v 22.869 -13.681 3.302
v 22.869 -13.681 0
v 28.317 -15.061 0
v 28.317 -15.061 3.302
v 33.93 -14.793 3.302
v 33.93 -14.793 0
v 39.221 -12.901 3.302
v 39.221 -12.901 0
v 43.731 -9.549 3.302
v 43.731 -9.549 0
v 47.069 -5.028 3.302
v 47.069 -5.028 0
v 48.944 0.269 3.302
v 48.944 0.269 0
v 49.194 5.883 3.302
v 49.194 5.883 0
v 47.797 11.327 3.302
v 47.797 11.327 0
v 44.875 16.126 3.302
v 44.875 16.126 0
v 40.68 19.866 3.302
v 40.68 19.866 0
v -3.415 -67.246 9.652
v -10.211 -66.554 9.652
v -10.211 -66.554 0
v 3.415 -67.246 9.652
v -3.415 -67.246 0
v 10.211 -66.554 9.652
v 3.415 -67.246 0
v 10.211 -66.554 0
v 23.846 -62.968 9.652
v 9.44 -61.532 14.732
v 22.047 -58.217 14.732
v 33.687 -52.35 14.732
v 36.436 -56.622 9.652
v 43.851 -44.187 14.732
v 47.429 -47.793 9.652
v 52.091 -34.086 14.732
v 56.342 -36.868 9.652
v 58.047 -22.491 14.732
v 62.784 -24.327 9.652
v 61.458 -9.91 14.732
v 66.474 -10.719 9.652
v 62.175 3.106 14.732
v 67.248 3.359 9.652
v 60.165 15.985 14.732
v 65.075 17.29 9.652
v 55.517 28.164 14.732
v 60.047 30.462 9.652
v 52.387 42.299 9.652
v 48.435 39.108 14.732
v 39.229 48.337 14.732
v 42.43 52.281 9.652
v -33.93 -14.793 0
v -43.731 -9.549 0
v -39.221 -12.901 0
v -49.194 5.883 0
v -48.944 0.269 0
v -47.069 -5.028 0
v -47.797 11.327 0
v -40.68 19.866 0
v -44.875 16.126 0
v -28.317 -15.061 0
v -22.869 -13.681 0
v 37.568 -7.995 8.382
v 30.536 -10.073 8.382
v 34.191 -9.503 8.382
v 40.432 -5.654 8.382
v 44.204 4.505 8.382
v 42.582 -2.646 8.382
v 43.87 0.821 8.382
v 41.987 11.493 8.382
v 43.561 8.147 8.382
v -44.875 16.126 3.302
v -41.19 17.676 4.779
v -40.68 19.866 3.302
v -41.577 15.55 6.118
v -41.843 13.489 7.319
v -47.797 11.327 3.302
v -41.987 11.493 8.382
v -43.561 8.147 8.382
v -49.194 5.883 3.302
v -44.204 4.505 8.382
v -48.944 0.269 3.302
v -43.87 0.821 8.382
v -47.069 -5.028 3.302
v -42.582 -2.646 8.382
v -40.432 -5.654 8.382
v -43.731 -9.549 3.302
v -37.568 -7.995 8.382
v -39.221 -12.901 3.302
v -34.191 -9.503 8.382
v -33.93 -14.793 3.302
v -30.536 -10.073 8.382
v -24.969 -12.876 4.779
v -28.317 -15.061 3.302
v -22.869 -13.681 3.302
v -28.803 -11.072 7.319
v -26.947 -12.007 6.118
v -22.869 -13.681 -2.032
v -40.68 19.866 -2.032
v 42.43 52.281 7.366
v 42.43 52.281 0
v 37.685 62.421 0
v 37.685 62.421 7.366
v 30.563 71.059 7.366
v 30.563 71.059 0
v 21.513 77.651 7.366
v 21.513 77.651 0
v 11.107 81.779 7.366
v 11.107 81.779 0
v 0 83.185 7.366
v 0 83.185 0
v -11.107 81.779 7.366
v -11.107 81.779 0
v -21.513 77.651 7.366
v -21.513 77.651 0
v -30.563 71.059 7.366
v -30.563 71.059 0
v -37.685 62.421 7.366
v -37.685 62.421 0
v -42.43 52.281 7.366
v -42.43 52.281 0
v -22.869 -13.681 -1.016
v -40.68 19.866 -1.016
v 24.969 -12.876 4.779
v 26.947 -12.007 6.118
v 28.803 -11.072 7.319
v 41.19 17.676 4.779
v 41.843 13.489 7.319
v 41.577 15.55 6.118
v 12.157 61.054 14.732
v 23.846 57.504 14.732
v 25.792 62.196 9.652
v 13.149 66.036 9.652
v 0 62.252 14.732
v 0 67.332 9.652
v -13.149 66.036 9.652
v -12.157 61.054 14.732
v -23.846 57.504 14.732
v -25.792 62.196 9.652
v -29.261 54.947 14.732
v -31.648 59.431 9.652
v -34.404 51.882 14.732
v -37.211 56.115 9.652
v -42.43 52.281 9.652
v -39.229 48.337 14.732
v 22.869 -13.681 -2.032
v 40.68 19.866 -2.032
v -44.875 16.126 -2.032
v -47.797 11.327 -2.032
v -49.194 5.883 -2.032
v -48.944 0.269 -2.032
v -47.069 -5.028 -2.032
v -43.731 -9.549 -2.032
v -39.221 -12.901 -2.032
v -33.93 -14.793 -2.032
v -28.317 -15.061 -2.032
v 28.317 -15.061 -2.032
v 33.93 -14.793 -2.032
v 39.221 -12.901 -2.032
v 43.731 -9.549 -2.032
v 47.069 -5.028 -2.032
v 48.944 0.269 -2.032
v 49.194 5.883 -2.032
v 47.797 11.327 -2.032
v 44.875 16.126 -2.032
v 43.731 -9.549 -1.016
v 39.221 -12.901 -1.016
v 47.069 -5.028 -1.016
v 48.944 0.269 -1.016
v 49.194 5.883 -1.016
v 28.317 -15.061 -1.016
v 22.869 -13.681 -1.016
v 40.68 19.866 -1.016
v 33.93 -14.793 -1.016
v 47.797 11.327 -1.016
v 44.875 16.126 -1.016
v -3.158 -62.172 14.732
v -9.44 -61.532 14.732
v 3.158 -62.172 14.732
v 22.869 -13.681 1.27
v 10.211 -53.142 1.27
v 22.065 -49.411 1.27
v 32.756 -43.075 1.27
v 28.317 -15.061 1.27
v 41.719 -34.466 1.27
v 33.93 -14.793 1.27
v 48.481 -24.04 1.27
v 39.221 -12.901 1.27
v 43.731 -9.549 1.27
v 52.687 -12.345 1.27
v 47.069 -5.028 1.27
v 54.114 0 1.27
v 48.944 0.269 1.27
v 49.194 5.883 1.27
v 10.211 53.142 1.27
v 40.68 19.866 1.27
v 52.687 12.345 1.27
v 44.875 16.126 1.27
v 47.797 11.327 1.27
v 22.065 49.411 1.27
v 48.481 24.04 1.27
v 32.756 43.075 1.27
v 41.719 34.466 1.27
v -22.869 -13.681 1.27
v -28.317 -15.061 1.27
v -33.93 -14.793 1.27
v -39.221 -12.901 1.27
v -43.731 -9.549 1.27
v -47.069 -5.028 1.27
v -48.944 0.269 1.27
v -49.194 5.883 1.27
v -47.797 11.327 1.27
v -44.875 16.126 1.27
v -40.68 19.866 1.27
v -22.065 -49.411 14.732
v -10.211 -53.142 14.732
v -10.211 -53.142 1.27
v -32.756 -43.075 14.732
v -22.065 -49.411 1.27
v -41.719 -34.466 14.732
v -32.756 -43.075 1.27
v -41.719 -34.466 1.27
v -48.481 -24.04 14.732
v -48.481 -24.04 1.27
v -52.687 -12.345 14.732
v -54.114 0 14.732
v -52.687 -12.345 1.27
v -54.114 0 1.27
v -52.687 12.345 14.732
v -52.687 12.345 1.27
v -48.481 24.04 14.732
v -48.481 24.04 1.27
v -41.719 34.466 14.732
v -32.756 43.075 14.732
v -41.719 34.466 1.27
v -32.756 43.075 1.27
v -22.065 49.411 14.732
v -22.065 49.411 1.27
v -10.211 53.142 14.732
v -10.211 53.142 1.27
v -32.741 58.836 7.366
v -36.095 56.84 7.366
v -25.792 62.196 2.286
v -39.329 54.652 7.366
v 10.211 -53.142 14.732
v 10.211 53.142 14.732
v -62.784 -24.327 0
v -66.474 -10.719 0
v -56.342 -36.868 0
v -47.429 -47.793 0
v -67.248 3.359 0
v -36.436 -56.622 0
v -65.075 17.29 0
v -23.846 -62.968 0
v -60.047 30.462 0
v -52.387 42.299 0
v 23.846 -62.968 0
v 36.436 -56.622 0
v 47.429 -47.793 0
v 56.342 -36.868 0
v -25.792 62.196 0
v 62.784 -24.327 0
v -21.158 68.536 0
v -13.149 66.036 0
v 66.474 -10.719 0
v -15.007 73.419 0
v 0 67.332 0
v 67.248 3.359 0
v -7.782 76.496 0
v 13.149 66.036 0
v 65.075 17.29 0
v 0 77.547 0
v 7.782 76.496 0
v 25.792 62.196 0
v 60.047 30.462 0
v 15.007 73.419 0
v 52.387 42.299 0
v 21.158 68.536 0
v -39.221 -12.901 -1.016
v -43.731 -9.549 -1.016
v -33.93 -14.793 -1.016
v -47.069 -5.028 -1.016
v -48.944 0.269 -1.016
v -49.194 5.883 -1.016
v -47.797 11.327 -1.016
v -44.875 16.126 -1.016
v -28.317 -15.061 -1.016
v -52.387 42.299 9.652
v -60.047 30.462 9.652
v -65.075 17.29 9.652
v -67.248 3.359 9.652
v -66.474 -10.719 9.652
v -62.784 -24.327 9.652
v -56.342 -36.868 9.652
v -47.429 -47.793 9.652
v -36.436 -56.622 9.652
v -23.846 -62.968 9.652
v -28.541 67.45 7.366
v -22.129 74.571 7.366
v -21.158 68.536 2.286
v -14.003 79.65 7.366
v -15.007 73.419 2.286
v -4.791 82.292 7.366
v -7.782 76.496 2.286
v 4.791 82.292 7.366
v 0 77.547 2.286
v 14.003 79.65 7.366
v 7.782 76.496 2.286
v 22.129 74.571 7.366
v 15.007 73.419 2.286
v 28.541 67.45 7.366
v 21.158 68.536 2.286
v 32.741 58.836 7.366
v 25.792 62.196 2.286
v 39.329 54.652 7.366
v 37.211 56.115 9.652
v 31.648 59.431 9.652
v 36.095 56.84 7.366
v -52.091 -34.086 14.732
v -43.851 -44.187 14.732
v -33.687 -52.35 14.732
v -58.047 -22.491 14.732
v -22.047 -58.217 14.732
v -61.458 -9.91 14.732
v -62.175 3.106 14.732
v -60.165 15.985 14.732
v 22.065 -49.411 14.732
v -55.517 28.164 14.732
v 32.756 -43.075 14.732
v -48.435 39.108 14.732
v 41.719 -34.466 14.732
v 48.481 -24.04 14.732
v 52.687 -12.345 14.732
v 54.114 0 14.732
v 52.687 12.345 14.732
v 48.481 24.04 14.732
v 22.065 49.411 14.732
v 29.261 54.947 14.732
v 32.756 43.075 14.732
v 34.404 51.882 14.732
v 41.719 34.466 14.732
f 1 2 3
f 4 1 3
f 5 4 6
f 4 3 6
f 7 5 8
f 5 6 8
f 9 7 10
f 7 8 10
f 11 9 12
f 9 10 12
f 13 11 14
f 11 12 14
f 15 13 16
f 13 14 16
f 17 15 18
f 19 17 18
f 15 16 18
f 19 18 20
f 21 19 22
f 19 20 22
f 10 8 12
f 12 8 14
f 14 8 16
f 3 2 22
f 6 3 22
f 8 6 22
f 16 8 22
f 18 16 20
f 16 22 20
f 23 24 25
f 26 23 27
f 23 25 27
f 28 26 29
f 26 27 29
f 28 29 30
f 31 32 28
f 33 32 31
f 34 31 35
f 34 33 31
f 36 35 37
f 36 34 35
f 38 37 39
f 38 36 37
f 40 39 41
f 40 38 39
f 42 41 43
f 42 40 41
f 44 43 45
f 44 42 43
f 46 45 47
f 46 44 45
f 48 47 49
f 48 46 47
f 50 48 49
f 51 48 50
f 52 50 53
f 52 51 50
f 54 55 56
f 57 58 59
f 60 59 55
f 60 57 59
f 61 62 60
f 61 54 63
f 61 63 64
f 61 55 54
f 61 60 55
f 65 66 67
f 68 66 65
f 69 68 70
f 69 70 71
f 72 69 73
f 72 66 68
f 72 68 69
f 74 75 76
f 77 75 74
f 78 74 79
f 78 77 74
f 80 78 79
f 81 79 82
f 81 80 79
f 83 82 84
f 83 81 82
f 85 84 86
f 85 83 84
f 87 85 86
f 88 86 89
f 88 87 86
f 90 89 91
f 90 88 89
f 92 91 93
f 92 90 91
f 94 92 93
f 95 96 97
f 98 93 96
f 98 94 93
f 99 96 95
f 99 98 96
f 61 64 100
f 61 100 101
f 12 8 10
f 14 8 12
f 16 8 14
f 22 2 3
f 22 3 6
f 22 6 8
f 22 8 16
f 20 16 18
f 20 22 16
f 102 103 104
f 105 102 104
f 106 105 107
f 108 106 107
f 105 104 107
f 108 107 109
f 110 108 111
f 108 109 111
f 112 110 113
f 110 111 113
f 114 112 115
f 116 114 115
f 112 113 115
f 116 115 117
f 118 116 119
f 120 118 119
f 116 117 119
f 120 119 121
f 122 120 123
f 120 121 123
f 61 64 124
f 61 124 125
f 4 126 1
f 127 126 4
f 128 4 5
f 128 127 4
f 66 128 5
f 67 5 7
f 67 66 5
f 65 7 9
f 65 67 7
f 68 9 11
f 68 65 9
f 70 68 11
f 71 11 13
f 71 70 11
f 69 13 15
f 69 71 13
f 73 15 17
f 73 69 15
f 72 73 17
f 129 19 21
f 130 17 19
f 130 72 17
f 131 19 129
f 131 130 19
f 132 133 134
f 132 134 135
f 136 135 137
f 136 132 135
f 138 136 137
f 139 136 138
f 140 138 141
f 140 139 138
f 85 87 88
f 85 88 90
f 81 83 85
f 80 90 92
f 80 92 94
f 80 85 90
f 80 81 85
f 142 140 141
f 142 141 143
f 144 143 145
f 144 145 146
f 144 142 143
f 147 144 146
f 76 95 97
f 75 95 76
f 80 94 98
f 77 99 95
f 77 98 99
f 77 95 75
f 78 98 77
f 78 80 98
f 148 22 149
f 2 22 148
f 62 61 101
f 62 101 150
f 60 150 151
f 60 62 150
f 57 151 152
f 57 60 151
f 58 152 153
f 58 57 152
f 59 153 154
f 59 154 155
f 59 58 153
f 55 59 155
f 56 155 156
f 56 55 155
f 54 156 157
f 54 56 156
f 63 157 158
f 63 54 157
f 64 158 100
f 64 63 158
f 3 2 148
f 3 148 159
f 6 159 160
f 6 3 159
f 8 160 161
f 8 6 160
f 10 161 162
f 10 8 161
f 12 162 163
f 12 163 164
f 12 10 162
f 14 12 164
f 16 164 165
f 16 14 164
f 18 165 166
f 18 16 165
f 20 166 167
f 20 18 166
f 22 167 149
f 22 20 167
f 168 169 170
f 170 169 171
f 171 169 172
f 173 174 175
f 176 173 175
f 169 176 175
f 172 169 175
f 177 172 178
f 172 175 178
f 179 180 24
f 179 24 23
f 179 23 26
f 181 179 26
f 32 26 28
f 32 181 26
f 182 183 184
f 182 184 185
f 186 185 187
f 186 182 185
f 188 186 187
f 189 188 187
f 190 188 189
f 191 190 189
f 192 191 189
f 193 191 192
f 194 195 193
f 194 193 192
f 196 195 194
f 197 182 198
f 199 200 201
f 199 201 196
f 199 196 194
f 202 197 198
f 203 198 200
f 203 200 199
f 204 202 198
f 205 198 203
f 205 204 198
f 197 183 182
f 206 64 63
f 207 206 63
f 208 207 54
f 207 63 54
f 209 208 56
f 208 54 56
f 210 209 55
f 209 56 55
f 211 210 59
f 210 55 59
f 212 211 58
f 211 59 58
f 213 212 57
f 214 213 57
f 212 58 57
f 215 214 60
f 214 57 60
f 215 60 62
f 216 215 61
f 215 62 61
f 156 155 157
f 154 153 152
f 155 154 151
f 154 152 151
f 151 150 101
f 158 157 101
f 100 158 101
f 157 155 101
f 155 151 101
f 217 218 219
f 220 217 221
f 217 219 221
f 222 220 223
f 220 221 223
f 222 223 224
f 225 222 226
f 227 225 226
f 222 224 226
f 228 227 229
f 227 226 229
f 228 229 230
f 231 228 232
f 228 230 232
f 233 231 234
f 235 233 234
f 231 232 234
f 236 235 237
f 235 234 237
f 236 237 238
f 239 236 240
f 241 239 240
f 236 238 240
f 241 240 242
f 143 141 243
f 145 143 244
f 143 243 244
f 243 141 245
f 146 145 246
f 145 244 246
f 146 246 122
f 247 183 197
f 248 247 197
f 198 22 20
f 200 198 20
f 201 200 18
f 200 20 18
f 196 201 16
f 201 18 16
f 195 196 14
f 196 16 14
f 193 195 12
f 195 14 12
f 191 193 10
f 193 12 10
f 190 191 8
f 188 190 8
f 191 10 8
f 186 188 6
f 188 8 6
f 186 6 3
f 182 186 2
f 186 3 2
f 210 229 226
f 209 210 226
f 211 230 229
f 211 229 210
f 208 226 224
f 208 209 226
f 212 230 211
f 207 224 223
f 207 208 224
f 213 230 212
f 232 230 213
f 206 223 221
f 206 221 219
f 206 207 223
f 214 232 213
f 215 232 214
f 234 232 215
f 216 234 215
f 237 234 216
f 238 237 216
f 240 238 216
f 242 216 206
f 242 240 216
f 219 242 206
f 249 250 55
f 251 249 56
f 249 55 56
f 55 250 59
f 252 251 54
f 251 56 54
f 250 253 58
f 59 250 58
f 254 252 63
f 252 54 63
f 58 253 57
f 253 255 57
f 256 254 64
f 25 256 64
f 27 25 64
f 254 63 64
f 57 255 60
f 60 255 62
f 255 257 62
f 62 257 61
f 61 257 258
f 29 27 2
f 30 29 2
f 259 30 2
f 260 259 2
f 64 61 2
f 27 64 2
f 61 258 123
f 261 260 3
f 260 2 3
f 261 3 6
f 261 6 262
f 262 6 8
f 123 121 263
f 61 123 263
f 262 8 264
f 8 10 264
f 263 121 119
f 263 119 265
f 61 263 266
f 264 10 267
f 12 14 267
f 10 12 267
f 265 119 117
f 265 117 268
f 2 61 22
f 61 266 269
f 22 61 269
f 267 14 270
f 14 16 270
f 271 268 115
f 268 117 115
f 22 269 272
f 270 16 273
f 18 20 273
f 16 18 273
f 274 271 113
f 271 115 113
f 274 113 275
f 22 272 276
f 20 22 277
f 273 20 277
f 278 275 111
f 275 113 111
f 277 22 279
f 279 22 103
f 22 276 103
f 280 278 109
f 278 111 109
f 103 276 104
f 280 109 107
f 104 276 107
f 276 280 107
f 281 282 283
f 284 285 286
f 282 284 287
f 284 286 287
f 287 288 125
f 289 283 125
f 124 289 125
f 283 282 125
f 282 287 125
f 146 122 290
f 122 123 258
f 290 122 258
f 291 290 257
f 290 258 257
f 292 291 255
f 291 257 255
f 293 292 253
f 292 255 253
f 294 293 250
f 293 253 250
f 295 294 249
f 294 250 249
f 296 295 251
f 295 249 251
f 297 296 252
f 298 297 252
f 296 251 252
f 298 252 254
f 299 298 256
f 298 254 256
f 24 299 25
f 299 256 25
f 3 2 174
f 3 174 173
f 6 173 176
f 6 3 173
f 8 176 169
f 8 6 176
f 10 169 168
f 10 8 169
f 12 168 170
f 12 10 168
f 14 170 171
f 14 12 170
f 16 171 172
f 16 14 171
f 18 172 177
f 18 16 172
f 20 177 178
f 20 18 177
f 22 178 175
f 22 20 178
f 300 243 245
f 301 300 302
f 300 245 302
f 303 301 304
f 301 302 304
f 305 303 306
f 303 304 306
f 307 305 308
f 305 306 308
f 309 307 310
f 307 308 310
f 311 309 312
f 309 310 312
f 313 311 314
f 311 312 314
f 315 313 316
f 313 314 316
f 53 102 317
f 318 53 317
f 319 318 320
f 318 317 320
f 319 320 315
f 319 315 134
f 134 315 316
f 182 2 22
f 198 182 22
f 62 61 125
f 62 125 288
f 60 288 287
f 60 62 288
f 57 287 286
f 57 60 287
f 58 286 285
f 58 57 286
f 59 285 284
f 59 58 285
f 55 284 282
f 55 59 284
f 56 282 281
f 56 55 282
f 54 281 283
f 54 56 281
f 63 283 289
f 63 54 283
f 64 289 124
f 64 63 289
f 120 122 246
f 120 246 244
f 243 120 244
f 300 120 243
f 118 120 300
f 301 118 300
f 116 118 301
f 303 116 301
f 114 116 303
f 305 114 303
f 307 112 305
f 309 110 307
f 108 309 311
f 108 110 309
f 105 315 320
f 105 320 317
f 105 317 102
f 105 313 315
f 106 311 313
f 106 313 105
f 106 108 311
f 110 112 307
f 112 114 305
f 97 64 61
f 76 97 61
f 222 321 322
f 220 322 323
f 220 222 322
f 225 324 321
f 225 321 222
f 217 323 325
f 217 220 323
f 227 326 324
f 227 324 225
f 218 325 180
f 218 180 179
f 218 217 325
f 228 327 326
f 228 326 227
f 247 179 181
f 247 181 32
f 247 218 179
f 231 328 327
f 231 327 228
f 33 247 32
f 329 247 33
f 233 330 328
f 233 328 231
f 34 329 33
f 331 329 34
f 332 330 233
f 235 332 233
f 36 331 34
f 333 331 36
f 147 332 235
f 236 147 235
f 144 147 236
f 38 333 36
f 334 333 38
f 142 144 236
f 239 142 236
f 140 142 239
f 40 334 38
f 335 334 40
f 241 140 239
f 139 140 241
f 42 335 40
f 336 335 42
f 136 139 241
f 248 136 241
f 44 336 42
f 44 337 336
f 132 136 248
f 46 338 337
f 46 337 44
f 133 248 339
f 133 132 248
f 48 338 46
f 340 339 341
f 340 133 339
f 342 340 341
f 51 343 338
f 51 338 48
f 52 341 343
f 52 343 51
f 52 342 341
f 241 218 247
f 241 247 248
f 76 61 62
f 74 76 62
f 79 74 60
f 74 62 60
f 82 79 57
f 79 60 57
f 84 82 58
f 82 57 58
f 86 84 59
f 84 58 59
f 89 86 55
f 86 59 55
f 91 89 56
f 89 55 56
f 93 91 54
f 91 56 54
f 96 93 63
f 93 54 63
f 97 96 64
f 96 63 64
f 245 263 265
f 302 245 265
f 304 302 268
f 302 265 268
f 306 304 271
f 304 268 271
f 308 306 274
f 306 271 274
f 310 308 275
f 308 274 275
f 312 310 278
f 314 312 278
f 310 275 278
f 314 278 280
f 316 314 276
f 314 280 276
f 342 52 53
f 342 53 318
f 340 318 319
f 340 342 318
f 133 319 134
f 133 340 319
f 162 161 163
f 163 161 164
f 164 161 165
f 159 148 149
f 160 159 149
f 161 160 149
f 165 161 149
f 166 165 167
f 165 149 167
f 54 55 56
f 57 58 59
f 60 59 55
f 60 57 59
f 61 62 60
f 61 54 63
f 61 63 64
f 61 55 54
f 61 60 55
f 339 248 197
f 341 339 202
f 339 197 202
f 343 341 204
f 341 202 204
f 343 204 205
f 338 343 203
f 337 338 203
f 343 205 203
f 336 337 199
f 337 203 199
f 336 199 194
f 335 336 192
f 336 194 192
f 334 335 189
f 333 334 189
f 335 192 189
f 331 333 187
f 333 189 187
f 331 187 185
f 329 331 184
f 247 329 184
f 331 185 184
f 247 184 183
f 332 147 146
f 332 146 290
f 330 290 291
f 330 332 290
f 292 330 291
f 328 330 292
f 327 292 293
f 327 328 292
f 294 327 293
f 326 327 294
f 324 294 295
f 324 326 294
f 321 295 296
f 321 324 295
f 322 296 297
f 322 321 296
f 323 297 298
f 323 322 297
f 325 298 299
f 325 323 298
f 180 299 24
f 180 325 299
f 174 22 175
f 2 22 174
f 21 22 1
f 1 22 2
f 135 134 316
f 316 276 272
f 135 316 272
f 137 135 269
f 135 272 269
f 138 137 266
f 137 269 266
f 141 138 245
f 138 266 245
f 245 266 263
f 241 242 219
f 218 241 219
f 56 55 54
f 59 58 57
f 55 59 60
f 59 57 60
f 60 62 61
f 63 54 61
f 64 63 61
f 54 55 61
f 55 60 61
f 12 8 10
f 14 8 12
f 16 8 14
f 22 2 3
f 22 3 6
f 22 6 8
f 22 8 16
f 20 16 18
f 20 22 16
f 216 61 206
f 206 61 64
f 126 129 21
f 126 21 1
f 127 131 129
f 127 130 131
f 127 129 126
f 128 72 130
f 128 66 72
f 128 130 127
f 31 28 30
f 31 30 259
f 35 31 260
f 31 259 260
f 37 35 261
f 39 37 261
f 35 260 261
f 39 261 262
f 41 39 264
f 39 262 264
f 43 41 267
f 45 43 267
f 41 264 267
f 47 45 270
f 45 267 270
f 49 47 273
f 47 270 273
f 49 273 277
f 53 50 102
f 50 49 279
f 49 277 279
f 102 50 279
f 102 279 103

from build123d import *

# Parameters (mm, degrees)
F1_DEPTH  = 14.732
F2_DEPTH  = 1.27
F3_DEPTH  = 2.032
F4_DEPTH  = 1.016
F5_DEPTH  = 8.382
F6_SIZE   = 5.08
F6_2_SIZE = 5.08
F7_SIZE   = 5.08
F8_DEPTH  = 7.366
F9_SIZE   = 5.08


with BuildPart() as f1:
    # F0 (on Top) → F1 (new body)
    with BuildSketch(Plane.XY):
        with BuildLine():
            ThreePointArc((10.2107217535, -66.5535269893), (51.0937451166, -43.8527080509), (67.3322418566, 0))
            ThreePointArc((67.3322418566, 0), (60.7887815244, 28.9543577759), (42.4302094544, 52.2810493305))
            ThreePointArc((42.4302094544, 52.2810493305), (34.46970949, 57.840037354), (25.7924495128, 62.1963048868))
            ThreePointArc((25.7924495128, 62.1963048868), (0, 67.3322418566), (-25.7924495128, 62.1963048868))
            ThreePointArc((-25.7924495128, 62.1963048868), (-34.46970949, 57.840037354), (-42.4302094544, 52.2810493305))
            ThreePointArc((-42.4302094544, 52.2810493305), (-64.9860065082, -17.6195843185), (-10.2107217535, -66.5535269893))
            ThreePointArc((-10.2107217535, -66.5535269893), (0, -67.3322418566), (10.2107217535, -66.5535269893))
        make_face()
        with BuildLine():
            ThreePointArc((-10.2107217535, -53.1421852332), (-54.1142374065, 0), (-10.2107217535, 53.1421852332))
            Line((-10.2107217535, 53.1421852332), (-10.2107217535, -53.1421852332))
        make_face(mode=Mode.SUBTRACT)
        with BuildLine():
            ThreePointArc((10.2107217535, 53.1421852332), (54.1142374065, 0), (10.2107217535, -53.1421852332))
            Line((10.2107217535, -53.1421852332), (10.2107217535, 53.1421852332))
        make_face(mode=Mode.SUBTRACT)
    extrude(amount=F1_DEPTH)

    # F0 (on Top) → F2 (join)
    with BuildSketch(Plane.XY):
        with BuildLine():
            Line((-10.2107217535, -53.1421852332), (-10.2107217535, 53.1421852332))
            ThreePointArc((-10.2107217535, 53.1421852332), (-54.1142374065, 0), (-10.2107217535, -53.1421852332))
        make_face()
        with BuildLine():
            Line((-40.6804420054, 19.8660306633), (-22.8690840304, -13.6814415455))
            ThreePointArc((-22.8690840304, -13.6814415455), (-47.0691326412, -5.0279444465), (-40.6804420054, 19.8660306633))
        make_face(mode=Mode.SUBTRACT)
        with BuildLine():
            Line((10.2107217535, 53.1421852332), (10.2107217535, -53.1421852332))
            ThreePointArc((10.2107217535, -53.1421852332), (54.1142374065, 0), (10.2107217535, 53.1421852332))
        make_face()
        with BuildLine():
            ThreePointArc((40.6804420054, 19.8660306633), (47.0691326412, -5.0279444465), (22.8690840304, -13.6814415455))
            Line((22.8690840304, -13.6814415455), (40.6804420054, 19.8660306633))
        make_face(mode=Mode.SUBTRACT)
    extrude(amount=F2_DEPTH)

    # F7
    f7_edges = [f1.edges().sort_by_distance(p)[0] for p in [
        (10.210722, 66.553527, 14.732),
    ]]
    chamfer(f7_edges, length=F7_SIZE)

    # F0 (on Top) → F8 (join)
    with BuildSketch(Plane.XY):
        with BuildLine():
            ThreePointArc((25.7924495128, 62.1963048868), (34.46970949, 57.840037354), (42.4302094544, 52.2810493305))
            ThreePointArc((42.4302094544, 52.2810493305), (0, 83.1852659045), (-42.4302094544, 52.2810493305))
            ThreePointArc((-42.4302094544, 52.2810493305), (-34.46970949, 57.840037354), (-25.7924495128, 62.1963048868))
            ThreePointArc((-25.7924495128, 62.1963048868), (0, 77.5467522408), (25.7924495128, 62.1963048868))
        make_face()
    extrude(amount=F8_DEPTH)

    # F9
    f9_edges = [f1.edges().sort_by_distance(p)[0] for p in [
        (0, 77.546752, 7.366),
    ]]
    chamfer(f9_edges, length=F9_SIZE)


with BuildPart() as f3:
    # F0 (on Top) → F3 (new body)
    with BuildSketch(Plane.XY):
        with BuildLine():
            ThreePointArc((-40.6804420054, 19.8660306633), (-47.0691326412, -5.0279444465), (-22.8690840304, -13.6814415455))
            Line((-22.8690840304, -13.6814415455), (-40.6804420054, 19.8660306633))
        make_face()
    extrude(amount=-F3_DEPTH)


with BuildPart() as f3b:
    # F0 (on Top) → F3, piece 2 (new body)
    with BuildSketch(Plane.XY):
        with BuildLine():
            Line((40.6804420054, 19.8660306633), (22.8690840304, -13.6814415455))
            ThreePointArc((22.8690840304, -13.6814415455), (47.0691326412, -5.0279444465), (40.6804420054, 19.8660306633))
        make_face()
    extrude(amount=-F3_DEPTH)


with BuildPart() as f4:
    # F0 (on Top) → F4 (new body)
    with BuildSketch(Plane.XY):
        with BuildLine():
            ThreePointArc((-40.6804420054, 19.8660306633), (-47.0691326412, -5.0279444465), (-22.8690840304, -13.6814415455))
            Line((-22.8690840304, -13.6814415455), (-40.6804420054, 19.8660306633))
        make_face()
    extrude(amount=-F4_DEPTH)


with BuildPart() as f4b:
    # F0 (on Top) → F4, piece 2 (new body)
    with BuildSketch(Plane.XY):
        with BuildLine():
            Line((40.6804420054, 19.8660306633), (22.8690840304, -13.6814415455))
            ThreePointArc((22.8690840304, -13.6814415455), (47.0691326412, -5.0279444465), (40.6804420054, 19.8660306633))
        make_face()
    extrude(amount=-F4_DEPTH)


with BuildPart() as f5:
    # F0 (on Top) → F5 (new body)
    with BuildSketch(Plane.XY):
        with BuildLine():
            Line((40.6804420054, 19.8660306633), (22.8690840304, -13.6814415455))
            ThreePointArc((22.8690840304, -13.6814415455), (47.0691326412, -5.0279444465), (40.6804420054, 19.8660306633))
        make_face()
    extrude(amount=F5_DEPTH)

    # F6#2
    f6_2_edges = [f5.edges().sort_by_distance(p)[0] for p in [
        (47.069133, -5.027944, 8.382),
        (31.774763, 3.092295, 8.382),
    ]]
    chamfer(f6_2_edges, length=F6_2_SIZE)


with BuildPart() as f5b:
    # F0 (on Top) → F5, piece 2 (new body)
    with BuildSketch(Plane.XY):
        with BuildLine():
            ThreePointArc((-40.6804420054, 19.8660306633), (-47.0691326412, -5.0279444465), (-22.8690840304, -13.6814415455))
            Line((-22.8690840304, -13.6814415455), (-40.6804420054, 19.8660306633))
        make_face()
    extrude(amount=F5_DEPTH)

    # F6
    f6_edges = [f5b.edges().sort_by_distance(p)[0] for p in [
        (-31.774763, 3.092295, 8.382),
        (-47.069133, -5.027944, 8.382),
    ]]
    chamfer(f6_edges, length=F6_SIZE)


solid = Compound([f1.part, f3.part, f3b.part, f4.part, f4b.part, f5.part, f5b.part])
